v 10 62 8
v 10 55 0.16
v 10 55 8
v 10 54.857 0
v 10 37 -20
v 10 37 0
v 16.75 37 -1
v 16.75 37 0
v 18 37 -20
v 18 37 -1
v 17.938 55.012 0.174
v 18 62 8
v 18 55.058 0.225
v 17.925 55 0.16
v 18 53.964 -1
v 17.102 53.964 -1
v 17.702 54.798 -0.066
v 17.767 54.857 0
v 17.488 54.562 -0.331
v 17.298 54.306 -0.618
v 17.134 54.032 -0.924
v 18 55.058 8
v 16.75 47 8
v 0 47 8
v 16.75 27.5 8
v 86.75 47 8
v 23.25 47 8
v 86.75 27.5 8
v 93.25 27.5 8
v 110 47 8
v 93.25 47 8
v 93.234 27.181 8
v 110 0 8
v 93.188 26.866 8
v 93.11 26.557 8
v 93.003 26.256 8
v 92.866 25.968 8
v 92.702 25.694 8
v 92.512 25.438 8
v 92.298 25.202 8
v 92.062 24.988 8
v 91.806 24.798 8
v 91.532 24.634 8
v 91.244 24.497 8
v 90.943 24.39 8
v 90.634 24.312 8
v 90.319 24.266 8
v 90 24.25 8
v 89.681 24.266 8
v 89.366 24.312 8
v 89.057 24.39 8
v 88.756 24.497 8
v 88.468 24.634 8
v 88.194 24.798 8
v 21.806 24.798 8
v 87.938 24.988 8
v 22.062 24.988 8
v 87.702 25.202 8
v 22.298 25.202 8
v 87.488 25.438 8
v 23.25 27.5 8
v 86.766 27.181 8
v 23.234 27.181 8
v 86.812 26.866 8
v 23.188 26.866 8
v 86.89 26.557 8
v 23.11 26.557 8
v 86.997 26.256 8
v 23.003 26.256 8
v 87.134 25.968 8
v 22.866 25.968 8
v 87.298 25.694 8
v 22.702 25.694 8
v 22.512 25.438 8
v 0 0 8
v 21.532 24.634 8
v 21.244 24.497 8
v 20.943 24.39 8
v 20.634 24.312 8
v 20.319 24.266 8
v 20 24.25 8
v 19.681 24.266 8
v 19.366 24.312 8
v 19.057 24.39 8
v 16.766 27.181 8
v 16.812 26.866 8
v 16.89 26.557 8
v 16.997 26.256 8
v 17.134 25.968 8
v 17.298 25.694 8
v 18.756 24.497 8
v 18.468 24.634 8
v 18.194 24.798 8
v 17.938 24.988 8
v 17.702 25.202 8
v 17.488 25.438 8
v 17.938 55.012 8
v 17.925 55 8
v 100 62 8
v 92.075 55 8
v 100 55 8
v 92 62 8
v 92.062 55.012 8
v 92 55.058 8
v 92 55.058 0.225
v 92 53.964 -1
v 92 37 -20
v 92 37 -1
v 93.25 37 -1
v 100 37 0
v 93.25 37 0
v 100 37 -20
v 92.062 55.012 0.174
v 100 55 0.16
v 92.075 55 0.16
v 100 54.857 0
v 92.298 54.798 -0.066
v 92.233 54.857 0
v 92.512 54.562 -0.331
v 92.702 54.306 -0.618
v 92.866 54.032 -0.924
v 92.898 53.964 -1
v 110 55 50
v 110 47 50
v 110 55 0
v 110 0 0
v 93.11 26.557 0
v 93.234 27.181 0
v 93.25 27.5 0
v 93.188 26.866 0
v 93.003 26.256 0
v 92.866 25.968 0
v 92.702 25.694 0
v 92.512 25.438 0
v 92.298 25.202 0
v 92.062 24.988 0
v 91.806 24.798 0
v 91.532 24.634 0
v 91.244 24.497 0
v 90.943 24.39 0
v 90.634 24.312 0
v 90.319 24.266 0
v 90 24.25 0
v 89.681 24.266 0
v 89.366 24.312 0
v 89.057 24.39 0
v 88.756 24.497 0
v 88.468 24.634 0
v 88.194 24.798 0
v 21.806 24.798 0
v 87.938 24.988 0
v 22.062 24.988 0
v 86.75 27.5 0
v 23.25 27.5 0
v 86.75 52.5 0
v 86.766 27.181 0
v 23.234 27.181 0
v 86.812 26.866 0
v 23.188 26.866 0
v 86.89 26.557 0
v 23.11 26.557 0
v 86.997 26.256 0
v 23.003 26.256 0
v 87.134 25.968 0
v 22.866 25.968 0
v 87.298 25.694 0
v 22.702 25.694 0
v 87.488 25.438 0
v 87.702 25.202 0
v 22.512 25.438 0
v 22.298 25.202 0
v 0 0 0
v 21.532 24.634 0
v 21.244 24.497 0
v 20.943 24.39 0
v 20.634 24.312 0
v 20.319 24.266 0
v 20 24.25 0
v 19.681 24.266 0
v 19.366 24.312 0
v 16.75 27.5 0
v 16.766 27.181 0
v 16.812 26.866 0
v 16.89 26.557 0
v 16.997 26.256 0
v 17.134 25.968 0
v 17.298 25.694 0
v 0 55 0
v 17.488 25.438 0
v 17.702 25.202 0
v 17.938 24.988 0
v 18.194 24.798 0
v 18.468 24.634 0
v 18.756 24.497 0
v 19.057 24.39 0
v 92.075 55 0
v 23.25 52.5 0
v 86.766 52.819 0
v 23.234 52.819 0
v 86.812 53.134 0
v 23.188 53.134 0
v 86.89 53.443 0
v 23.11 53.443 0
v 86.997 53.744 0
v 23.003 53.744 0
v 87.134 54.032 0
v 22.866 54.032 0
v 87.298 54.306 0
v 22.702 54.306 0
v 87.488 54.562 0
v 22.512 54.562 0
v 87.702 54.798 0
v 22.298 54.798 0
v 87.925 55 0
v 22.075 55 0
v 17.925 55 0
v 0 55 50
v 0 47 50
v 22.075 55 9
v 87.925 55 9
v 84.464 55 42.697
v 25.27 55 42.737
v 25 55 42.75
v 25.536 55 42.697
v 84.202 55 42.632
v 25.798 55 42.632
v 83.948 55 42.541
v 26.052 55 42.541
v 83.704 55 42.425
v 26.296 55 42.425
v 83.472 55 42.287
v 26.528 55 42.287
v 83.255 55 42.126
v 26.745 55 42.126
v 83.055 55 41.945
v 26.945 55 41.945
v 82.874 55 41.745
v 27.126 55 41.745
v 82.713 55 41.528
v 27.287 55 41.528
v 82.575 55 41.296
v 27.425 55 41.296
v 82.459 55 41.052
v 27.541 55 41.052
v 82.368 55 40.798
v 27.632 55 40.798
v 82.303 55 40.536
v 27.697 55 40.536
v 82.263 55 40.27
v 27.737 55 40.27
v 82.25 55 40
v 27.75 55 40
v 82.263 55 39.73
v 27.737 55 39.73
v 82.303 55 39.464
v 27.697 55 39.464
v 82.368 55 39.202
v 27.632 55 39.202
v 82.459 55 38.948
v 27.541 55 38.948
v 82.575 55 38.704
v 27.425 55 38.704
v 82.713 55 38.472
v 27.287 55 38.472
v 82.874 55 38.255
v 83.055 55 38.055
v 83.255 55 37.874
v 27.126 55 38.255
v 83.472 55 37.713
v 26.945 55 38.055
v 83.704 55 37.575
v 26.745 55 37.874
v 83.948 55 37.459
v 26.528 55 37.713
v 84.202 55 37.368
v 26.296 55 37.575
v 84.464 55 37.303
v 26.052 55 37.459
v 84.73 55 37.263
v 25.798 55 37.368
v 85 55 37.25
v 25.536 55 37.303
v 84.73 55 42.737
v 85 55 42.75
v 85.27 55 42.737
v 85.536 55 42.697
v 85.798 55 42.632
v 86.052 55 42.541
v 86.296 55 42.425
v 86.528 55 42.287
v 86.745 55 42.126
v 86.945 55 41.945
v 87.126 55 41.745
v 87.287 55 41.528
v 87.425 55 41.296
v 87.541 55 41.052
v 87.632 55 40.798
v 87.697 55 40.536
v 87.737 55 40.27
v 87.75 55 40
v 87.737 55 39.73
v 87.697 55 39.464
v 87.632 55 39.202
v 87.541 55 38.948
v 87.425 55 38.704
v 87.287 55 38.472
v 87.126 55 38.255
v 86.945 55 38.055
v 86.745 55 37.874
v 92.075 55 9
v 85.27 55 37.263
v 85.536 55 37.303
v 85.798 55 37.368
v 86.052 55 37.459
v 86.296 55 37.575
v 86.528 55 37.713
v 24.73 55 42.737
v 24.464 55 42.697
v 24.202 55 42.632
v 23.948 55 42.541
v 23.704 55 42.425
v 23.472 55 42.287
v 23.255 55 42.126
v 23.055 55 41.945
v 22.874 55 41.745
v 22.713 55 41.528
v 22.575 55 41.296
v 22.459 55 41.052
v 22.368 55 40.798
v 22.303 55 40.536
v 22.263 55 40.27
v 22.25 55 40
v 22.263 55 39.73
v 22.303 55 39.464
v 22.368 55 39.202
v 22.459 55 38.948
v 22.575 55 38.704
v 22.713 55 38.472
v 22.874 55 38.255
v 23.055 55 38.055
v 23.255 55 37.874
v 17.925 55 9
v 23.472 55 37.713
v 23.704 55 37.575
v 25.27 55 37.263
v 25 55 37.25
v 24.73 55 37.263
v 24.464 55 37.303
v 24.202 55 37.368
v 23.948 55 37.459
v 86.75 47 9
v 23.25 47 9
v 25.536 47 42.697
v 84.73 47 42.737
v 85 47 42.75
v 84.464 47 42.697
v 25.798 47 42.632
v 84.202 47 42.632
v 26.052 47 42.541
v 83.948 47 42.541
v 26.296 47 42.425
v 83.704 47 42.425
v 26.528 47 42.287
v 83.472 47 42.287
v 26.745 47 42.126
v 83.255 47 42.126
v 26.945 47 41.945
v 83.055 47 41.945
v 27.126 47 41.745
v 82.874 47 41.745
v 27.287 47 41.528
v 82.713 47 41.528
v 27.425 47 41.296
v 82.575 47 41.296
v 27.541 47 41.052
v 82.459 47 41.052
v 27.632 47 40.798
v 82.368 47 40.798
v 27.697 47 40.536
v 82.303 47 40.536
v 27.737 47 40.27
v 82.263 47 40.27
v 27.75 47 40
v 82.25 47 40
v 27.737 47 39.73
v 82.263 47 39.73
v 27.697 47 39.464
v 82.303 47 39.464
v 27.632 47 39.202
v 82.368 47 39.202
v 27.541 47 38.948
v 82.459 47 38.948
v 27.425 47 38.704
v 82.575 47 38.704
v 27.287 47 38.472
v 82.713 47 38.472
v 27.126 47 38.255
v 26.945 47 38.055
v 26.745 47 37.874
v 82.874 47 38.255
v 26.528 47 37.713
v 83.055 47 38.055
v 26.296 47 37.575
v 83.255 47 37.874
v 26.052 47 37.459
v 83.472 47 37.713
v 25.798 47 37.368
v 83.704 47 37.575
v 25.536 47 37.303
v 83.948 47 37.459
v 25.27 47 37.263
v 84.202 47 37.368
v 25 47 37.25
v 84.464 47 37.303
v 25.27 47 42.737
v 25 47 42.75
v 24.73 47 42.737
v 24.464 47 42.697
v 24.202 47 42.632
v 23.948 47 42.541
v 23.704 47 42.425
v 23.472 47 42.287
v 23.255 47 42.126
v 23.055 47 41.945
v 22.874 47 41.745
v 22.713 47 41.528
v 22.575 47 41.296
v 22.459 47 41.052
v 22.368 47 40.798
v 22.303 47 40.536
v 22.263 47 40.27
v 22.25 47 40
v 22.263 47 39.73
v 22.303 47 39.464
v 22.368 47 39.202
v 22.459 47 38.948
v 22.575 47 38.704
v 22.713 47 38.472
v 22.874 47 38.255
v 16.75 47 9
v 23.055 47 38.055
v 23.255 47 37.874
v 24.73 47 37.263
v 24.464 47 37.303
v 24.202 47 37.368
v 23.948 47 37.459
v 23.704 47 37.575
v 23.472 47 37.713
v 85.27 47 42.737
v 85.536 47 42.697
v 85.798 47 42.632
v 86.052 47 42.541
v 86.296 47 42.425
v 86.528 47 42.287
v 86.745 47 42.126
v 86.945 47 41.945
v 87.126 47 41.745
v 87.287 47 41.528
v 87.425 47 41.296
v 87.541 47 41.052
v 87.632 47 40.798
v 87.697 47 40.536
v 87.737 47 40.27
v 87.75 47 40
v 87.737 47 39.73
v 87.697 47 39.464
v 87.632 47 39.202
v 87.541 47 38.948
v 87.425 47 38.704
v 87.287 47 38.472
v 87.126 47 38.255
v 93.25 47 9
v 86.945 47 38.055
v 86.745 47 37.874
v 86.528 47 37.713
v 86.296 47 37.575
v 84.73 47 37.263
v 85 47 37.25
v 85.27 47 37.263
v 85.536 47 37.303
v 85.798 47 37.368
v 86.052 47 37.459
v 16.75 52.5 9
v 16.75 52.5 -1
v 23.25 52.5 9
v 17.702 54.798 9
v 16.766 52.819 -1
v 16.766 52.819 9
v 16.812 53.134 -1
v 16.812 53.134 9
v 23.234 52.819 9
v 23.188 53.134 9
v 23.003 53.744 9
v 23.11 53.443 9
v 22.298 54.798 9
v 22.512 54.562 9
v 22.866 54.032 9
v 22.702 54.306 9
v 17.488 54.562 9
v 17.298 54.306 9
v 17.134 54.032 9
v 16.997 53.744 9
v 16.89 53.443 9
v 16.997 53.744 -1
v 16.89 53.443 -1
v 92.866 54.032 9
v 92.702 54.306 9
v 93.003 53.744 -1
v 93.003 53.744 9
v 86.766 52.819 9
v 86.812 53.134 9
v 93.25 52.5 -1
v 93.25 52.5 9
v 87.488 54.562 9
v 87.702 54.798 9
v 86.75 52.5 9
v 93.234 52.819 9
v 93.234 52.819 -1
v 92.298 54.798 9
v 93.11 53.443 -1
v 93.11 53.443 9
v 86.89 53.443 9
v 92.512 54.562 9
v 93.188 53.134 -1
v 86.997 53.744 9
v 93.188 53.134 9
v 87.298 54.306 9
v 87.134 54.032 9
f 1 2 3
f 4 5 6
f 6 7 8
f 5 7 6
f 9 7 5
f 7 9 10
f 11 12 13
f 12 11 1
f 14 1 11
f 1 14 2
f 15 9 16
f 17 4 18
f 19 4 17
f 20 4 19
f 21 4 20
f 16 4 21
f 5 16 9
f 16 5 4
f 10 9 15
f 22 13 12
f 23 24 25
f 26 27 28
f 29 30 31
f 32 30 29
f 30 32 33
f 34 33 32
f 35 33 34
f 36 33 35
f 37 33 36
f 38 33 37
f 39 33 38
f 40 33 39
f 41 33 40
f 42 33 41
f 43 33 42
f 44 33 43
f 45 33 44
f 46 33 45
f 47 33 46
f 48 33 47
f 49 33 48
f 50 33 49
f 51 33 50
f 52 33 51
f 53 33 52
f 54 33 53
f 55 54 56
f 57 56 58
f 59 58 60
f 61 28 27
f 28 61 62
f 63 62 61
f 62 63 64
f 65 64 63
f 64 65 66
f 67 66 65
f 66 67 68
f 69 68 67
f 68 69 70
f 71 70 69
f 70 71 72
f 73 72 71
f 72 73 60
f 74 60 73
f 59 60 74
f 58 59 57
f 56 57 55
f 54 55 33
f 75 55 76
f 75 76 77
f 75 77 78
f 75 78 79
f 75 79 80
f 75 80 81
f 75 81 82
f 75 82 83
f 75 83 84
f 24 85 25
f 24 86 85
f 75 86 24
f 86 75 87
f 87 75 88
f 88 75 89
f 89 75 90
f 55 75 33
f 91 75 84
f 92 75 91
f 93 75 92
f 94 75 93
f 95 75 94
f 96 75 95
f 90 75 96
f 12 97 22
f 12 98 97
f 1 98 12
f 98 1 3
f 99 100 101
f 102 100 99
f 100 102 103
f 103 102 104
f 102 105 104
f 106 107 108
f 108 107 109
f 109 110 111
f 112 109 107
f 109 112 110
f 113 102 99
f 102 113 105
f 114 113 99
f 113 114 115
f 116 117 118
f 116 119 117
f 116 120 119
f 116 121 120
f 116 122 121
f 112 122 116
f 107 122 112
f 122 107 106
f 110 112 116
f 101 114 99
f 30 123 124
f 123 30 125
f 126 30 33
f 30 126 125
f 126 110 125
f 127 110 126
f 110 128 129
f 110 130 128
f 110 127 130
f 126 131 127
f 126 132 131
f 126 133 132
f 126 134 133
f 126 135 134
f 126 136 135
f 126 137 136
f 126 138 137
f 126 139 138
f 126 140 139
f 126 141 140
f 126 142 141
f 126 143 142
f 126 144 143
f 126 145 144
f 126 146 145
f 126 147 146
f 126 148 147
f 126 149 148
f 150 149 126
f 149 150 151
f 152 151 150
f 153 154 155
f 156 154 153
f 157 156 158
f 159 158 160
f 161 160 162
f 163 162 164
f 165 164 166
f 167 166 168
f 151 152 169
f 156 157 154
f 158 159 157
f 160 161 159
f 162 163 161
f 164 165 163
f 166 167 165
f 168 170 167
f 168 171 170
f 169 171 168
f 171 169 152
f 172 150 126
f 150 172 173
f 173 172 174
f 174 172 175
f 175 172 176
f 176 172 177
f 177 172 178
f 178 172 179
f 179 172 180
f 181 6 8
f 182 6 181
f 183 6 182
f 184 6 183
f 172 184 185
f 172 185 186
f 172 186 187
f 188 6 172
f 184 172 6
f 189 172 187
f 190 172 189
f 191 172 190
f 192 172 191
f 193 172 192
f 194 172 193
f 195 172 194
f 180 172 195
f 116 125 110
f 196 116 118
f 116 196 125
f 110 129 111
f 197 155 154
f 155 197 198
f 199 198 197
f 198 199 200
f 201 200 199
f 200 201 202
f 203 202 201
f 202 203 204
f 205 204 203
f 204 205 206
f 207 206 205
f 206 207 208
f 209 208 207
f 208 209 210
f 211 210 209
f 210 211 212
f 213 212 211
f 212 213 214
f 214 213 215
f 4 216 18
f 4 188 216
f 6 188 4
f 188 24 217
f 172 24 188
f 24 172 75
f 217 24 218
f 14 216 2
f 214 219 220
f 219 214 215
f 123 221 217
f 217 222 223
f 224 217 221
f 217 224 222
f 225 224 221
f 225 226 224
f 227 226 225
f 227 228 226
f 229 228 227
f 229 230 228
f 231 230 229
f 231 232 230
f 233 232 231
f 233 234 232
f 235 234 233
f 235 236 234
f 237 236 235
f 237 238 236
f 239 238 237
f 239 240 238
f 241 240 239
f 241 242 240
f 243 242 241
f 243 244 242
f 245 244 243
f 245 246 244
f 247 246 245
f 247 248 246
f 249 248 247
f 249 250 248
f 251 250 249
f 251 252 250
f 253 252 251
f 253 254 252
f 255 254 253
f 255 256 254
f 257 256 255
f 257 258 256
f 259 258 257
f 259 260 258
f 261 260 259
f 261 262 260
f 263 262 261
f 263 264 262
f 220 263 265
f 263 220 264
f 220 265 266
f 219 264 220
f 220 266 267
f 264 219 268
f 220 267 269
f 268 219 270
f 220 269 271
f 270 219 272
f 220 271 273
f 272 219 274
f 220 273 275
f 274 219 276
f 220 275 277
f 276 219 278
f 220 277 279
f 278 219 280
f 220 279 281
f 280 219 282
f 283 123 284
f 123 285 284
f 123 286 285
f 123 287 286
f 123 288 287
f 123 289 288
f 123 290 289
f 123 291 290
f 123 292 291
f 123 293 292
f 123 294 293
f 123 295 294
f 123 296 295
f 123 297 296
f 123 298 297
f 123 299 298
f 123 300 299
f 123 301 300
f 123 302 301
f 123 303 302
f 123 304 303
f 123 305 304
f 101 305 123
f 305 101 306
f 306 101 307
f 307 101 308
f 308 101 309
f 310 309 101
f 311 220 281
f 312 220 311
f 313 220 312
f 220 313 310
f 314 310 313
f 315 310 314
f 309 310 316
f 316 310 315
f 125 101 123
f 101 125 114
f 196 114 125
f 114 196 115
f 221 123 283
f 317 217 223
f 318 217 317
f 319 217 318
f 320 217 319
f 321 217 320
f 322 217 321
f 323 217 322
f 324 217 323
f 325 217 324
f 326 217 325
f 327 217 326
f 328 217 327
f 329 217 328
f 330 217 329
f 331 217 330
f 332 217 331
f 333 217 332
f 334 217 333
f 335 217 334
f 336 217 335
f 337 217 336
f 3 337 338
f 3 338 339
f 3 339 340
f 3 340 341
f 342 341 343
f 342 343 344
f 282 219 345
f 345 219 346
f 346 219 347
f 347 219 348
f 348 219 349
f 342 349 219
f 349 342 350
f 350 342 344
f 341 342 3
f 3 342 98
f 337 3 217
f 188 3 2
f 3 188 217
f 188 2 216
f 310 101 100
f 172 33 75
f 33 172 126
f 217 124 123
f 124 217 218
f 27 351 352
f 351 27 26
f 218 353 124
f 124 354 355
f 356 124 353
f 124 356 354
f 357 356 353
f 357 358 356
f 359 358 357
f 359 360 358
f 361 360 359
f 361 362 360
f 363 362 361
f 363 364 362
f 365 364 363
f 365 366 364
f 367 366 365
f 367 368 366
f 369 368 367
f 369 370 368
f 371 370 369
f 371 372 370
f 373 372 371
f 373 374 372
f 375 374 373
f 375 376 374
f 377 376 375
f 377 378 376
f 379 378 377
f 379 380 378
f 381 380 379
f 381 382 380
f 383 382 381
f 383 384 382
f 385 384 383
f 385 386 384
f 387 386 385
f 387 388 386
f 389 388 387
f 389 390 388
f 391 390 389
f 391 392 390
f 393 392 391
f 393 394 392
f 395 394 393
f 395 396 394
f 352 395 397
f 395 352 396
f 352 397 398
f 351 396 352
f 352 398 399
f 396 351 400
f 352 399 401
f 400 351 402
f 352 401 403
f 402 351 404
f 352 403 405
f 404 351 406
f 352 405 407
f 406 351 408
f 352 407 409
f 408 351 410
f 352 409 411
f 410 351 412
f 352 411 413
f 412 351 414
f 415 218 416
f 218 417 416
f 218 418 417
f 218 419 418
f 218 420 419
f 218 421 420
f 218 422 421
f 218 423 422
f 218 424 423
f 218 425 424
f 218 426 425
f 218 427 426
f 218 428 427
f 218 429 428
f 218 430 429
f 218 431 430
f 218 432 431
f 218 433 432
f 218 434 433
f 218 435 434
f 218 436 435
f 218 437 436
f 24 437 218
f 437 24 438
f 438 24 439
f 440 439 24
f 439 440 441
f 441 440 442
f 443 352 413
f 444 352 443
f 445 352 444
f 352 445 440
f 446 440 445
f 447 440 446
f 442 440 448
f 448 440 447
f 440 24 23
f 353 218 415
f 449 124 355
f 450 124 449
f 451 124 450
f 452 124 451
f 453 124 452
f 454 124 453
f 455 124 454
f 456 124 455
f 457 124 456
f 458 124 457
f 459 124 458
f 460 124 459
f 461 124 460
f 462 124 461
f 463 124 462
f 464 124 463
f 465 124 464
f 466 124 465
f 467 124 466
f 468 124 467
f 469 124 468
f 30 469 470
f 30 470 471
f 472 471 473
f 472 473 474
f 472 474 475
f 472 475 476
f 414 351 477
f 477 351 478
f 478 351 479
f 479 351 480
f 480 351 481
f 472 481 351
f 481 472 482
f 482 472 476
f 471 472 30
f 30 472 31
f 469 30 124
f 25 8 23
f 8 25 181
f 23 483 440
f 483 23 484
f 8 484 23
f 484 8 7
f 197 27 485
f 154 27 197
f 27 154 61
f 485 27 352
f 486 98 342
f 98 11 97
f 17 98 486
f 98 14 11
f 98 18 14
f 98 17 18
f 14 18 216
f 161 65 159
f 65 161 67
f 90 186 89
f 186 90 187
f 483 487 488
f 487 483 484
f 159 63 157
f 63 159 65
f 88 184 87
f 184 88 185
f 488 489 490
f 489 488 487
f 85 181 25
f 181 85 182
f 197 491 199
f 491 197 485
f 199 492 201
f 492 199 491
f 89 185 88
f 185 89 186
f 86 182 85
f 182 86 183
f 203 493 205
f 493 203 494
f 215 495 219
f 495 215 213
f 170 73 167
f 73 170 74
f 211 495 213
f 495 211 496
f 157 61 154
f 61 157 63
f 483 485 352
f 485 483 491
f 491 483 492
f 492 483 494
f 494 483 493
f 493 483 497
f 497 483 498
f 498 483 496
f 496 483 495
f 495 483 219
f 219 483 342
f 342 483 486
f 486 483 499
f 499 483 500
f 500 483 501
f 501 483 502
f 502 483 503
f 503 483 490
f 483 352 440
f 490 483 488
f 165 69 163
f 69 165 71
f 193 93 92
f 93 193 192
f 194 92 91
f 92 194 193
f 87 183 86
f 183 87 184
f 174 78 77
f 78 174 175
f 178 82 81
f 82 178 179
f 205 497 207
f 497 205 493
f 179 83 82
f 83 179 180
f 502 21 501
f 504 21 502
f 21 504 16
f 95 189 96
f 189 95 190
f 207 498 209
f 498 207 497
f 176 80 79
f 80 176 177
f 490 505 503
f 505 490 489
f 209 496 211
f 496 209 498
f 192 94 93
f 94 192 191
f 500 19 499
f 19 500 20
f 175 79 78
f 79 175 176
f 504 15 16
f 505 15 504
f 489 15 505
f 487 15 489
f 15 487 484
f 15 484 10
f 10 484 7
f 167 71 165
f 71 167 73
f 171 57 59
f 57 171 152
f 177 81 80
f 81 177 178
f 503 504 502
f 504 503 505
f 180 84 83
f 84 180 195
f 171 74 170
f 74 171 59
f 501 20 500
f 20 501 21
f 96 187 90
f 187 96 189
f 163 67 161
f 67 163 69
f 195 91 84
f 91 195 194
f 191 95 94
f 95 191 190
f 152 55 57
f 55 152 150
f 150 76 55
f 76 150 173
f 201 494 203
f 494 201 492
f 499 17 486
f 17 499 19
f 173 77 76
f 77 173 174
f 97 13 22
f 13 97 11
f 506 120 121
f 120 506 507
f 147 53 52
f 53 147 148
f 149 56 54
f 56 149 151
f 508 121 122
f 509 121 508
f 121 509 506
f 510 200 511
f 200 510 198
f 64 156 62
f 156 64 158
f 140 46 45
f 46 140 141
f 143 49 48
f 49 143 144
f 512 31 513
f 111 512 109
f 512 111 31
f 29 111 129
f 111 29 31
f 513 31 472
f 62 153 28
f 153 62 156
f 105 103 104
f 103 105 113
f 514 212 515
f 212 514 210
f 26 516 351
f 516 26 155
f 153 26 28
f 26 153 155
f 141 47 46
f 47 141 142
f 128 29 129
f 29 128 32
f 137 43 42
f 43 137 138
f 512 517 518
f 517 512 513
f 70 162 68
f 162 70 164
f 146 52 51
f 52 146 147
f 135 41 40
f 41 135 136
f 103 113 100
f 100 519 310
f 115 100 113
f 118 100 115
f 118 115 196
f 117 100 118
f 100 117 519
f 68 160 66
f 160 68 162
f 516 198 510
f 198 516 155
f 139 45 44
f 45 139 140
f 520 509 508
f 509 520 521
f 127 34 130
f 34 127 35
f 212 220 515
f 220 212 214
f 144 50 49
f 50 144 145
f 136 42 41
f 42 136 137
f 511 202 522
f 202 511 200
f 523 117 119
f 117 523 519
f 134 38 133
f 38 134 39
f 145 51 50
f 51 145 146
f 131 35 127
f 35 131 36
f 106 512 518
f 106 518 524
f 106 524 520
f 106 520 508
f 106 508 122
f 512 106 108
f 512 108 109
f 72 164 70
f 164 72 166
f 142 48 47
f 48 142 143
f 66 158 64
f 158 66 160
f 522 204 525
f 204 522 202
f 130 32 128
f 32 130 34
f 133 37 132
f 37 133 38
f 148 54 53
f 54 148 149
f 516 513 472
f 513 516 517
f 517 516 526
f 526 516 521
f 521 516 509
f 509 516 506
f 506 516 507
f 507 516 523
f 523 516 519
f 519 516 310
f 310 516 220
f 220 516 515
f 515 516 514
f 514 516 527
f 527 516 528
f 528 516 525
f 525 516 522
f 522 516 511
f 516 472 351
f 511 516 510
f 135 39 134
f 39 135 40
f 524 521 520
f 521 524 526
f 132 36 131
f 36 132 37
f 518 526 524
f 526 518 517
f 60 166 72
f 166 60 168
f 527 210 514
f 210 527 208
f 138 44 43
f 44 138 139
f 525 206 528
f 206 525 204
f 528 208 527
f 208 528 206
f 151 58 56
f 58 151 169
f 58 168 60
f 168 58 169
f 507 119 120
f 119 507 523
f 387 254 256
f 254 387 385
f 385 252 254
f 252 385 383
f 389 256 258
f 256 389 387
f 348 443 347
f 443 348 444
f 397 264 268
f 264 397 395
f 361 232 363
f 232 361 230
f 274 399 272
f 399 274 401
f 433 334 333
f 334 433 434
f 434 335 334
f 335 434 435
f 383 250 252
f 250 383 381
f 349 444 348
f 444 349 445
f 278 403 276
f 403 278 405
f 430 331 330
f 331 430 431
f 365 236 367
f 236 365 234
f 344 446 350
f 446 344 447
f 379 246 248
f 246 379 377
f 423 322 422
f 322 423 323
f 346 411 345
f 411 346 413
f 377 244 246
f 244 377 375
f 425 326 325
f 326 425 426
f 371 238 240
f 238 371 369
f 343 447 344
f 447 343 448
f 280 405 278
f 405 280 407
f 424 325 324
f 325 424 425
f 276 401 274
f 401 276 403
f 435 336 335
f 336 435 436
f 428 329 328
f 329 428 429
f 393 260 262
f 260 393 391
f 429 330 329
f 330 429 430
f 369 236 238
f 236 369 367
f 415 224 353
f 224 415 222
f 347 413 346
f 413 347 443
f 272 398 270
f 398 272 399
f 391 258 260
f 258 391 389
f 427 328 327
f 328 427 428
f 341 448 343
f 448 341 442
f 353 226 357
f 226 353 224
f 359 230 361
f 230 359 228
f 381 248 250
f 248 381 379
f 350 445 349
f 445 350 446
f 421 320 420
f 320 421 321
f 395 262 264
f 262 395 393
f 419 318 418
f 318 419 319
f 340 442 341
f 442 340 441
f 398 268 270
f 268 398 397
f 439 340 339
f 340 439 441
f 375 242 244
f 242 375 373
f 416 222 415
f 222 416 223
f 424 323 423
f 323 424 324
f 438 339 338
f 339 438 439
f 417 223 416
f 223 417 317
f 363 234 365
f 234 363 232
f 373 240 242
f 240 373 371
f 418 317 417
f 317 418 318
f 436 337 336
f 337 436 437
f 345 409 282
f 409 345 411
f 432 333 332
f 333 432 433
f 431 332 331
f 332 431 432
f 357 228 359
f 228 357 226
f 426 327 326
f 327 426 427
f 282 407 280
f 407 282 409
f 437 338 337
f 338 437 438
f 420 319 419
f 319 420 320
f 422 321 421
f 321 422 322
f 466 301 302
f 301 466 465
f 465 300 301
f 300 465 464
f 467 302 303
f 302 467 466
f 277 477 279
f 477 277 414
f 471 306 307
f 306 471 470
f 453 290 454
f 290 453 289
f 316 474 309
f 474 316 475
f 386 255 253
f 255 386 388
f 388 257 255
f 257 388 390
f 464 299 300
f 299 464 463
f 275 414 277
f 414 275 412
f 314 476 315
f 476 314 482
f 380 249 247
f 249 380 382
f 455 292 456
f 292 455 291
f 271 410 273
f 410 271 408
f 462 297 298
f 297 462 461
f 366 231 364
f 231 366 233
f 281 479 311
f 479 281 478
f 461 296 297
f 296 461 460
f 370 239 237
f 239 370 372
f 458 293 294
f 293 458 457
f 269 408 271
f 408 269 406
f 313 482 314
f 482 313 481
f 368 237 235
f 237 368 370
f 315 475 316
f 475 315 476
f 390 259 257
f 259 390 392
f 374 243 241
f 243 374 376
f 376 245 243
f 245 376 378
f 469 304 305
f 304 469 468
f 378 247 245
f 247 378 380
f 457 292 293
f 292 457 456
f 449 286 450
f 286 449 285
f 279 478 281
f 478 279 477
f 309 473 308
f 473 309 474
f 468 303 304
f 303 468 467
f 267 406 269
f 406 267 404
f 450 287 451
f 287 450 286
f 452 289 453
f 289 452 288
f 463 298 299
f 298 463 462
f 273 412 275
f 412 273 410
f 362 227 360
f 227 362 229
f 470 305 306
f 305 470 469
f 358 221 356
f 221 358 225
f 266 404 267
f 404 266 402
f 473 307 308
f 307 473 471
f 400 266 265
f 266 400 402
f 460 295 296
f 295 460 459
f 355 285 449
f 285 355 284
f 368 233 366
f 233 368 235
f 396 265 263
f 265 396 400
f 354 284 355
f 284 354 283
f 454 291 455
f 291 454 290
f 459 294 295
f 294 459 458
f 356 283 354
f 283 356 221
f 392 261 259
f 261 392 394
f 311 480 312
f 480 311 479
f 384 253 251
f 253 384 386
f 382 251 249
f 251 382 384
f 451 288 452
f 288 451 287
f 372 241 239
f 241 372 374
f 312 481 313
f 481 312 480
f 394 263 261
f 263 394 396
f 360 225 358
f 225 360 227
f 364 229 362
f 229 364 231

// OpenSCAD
// Original MechIntel educational model. CC0-1.0. Units: mm.
// Not a standardized or load-rated component.
$fn=96;
width=110; depth=55; height=50; wall=8; blade_slot=9; travel=25; clamp_hole=6.5;
$fn=64;
difference(){
 union(){
  cube([width,depth,wall]);
  translate([0,depth-wall,wall]) cube([width,wall,height-wall]);
  for(x=[10,width-18]) translate([x,depth-wall-10,wall]) rotate([0,90,0]) linear_extrude(height=8) polygon([[0,0],[28,0],[0,25]]);
 }
 translate([width/2,depth-wall-10,height/2]) cube([width+2,blade_slot,27],center=true);
 for(x=[20,width-20]) hull(){translate([x,depth/2,-1]) cylinder(d=clamp_hole,h=wall+2);translate([x,depth/2+travel,-1]) cylinder(d=clamp_hole,h=wall+2);}
 for(x=[25,width-25]) translate([x,depth-wall-1,height-10]) rotate([-90,0,0]) cylinder(d=5.5,h=wall+2);
}
